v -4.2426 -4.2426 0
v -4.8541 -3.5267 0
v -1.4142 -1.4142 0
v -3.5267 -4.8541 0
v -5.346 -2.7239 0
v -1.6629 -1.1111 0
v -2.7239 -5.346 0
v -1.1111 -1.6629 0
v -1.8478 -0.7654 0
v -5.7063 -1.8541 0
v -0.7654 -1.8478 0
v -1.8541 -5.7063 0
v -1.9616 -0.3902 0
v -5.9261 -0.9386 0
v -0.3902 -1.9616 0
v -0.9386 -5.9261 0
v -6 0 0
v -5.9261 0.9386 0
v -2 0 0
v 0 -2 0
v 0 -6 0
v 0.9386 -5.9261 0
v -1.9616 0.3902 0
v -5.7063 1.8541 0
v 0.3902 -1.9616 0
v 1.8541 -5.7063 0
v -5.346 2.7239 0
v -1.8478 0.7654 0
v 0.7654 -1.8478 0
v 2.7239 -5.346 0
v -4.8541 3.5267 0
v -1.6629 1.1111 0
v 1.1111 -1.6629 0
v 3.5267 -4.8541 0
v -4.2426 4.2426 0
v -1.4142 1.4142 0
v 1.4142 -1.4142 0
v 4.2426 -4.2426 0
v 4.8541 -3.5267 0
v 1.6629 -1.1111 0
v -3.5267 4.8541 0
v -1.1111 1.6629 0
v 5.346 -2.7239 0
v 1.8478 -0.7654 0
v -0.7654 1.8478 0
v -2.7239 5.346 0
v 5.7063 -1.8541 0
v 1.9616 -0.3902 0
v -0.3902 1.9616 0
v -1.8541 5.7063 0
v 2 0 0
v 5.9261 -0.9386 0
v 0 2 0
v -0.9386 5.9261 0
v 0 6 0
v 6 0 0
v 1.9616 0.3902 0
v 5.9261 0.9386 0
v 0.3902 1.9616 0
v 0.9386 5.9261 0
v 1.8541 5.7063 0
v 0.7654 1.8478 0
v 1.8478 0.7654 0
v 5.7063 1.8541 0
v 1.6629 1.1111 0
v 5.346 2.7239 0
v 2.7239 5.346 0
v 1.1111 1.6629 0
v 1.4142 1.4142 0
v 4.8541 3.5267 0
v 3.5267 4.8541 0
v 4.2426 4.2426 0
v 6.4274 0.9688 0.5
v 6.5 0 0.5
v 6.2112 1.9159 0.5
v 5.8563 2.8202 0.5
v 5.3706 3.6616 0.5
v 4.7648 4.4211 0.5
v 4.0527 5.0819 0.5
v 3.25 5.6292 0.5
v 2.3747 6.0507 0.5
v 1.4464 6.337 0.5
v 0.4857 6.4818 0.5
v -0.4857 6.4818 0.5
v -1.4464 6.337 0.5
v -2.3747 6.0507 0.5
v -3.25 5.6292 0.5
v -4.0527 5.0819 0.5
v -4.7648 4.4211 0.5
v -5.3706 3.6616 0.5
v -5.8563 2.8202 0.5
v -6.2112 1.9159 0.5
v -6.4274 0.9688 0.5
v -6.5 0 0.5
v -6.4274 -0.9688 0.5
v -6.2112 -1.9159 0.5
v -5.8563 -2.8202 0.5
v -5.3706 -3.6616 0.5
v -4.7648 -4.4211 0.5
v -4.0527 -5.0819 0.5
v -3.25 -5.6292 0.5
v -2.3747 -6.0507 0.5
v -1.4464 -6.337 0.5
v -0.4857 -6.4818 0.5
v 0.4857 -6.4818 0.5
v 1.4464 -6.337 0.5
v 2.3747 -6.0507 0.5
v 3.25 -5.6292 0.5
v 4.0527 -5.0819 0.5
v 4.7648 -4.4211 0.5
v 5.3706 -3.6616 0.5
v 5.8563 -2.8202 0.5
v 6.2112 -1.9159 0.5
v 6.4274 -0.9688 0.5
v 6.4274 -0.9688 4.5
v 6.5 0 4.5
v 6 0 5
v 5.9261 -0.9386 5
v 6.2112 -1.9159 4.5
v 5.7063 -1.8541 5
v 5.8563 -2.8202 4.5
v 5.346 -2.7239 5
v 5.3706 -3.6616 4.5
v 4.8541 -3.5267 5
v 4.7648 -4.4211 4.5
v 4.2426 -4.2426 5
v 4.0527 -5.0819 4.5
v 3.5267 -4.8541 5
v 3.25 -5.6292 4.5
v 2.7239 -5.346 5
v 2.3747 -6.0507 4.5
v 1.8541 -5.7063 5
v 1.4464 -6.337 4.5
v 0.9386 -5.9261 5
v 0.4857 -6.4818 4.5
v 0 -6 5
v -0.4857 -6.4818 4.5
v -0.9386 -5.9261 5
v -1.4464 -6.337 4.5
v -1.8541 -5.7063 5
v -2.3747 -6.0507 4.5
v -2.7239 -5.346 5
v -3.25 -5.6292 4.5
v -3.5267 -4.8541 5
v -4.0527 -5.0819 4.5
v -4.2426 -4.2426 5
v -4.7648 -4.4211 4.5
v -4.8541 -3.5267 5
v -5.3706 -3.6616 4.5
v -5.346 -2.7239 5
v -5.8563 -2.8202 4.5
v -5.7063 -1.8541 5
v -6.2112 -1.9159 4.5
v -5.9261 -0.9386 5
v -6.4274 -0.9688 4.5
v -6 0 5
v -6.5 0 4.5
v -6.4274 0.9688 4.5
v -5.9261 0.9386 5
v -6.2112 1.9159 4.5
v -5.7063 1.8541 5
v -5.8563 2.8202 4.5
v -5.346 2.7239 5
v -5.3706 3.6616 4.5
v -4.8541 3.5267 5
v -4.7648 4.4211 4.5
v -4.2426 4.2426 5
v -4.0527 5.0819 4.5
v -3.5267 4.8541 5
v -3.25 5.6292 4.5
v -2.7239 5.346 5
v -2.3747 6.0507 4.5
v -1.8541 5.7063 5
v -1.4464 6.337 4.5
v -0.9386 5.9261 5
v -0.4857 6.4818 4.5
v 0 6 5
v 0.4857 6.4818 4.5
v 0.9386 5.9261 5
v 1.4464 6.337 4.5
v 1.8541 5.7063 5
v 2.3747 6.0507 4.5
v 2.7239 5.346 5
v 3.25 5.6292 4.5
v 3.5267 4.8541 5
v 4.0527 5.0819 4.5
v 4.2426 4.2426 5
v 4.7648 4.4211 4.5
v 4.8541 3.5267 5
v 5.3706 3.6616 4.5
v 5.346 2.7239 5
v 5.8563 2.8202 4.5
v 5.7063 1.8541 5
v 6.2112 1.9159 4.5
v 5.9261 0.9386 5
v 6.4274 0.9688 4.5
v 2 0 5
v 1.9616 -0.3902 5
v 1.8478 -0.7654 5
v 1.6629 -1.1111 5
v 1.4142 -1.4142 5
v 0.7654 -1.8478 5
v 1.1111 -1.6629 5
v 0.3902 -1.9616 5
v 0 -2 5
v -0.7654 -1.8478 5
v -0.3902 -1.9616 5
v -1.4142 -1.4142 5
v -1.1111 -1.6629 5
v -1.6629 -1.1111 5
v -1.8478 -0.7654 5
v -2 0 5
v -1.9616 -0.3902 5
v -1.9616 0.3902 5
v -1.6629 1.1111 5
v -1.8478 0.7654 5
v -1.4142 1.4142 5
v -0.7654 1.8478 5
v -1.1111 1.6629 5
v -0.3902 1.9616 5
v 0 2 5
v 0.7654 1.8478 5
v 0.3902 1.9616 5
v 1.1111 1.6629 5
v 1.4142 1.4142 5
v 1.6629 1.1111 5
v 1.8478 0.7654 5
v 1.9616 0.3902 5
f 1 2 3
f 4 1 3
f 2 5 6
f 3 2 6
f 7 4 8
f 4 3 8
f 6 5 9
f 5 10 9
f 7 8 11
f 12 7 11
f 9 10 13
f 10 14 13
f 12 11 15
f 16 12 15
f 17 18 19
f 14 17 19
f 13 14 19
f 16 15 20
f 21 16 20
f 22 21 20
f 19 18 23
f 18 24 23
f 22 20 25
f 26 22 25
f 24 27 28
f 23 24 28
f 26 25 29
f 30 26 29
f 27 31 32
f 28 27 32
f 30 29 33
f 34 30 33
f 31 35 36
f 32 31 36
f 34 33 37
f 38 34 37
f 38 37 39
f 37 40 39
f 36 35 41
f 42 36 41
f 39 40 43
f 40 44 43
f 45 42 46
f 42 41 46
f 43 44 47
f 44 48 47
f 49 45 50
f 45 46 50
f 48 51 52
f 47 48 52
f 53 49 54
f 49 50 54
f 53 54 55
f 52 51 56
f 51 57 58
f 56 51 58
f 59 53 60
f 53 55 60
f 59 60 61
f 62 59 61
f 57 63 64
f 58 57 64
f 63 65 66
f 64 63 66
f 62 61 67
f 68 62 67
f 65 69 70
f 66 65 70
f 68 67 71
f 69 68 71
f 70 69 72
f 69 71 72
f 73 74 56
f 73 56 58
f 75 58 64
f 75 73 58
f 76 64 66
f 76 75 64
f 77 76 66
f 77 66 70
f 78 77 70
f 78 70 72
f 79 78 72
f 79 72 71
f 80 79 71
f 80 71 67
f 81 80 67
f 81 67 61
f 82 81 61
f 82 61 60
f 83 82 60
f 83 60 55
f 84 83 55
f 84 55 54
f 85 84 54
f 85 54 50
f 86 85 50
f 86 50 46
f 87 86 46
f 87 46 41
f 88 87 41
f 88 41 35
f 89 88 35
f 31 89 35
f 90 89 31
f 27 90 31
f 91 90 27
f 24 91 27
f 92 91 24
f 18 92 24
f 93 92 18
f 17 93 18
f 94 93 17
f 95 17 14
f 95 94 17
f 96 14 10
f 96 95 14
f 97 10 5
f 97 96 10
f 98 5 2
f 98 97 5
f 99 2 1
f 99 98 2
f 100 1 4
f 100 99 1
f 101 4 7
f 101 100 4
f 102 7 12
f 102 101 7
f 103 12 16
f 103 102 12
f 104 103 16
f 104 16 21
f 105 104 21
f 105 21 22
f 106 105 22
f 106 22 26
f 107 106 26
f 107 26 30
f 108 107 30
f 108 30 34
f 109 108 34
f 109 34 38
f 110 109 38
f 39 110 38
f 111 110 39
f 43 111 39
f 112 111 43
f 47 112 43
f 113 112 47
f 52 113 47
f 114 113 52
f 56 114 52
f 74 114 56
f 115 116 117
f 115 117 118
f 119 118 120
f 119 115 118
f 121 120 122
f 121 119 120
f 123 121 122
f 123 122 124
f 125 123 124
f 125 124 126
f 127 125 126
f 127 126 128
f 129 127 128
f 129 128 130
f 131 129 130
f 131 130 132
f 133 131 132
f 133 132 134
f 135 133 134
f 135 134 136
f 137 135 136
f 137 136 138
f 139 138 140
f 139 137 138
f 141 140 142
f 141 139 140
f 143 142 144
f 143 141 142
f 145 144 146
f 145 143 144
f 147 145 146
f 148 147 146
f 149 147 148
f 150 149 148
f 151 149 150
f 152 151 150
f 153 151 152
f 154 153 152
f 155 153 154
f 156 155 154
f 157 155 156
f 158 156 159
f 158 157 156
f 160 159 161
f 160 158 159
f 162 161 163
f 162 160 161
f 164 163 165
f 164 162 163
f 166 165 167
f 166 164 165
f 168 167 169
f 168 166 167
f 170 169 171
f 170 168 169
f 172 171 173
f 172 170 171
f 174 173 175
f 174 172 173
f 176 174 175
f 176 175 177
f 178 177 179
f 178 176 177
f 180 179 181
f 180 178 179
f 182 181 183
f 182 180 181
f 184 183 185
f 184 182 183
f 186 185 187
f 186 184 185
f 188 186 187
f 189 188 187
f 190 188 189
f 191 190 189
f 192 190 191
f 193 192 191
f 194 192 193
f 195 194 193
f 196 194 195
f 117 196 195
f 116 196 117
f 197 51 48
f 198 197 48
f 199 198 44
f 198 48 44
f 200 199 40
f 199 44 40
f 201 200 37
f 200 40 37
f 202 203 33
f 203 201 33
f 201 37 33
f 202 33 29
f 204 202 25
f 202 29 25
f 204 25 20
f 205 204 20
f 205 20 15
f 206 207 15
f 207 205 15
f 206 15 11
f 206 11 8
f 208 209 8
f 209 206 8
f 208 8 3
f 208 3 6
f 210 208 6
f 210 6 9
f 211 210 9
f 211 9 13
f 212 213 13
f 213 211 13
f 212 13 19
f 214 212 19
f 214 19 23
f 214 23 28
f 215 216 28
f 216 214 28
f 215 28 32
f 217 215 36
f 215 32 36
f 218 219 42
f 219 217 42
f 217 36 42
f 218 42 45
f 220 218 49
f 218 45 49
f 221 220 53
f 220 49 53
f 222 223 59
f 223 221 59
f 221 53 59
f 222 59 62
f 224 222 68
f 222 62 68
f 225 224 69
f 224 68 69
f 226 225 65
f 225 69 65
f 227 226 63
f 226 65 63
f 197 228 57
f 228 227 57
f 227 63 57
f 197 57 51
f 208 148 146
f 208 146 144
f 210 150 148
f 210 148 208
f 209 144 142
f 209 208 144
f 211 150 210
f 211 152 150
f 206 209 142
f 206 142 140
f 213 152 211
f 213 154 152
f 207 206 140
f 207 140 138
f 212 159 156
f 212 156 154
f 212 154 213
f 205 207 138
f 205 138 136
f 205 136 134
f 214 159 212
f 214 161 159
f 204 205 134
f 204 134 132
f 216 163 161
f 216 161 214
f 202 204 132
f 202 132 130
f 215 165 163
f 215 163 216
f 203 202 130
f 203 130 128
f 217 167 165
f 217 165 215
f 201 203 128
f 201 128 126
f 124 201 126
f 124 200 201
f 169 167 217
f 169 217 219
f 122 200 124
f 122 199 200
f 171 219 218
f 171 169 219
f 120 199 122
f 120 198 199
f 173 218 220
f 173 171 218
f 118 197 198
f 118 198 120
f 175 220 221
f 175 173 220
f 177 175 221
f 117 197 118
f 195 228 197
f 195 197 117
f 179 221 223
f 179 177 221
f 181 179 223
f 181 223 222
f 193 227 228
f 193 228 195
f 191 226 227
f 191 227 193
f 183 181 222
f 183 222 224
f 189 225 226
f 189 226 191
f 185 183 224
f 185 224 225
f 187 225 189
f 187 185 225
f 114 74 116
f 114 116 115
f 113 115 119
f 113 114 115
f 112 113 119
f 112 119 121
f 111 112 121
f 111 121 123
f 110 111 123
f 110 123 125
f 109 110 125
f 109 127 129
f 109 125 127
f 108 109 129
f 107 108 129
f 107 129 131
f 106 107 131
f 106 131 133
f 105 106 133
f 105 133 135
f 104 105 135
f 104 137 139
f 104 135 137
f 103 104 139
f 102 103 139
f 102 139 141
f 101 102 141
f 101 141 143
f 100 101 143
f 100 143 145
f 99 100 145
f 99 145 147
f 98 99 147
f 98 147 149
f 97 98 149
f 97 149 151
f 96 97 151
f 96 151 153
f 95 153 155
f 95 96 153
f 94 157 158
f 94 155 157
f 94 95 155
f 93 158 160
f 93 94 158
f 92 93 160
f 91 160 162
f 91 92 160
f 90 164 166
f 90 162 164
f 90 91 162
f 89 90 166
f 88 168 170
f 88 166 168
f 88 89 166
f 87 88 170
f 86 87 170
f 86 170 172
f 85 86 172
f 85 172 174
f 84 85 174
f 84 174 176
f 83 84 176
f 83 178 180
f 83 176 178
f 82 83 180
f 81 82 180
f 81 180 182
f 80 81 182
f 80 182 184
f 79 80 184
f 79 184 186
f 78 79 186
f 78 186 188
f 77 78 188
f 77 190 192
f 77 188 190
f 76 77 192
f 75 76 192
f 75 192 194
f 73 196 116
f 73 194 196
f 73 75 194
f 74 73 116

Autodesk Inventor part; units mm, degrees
ref_plane "YZ Plane" through (0, 0, 0) normal (1, 0, 0) x (0, 1, 0)
ref_plane "XZ Plane" through (0, 0, 0) normal (0, 1, 0) x (-1, 0, 0)
ref_plane "XY Plane" through (0, 0, 0) normal (0, 0, 1) x (1, 0, 0)
sketch "Sketch1" plane through (0, 0, 0) normal (0, 0, 1) x (1, 0, 0)
  circle A0 centre (0, 0) radius 6.5
  circle A1 centre (0, 0) radius 2
  dimension "d0" = 13
  dimension "d1" = 4
extrude "Extrusion1" add sketch "Sketch1" along normal blind 5
chamfer "Chamfer1" distance 0.5 angle 45 1 edges at (-6.5, 0, 5)
chamfer "Chamfer2" distance 0.5 angle 45 1 edges at (-6.5, 0, 0)
properties part number "4mmBearing"
